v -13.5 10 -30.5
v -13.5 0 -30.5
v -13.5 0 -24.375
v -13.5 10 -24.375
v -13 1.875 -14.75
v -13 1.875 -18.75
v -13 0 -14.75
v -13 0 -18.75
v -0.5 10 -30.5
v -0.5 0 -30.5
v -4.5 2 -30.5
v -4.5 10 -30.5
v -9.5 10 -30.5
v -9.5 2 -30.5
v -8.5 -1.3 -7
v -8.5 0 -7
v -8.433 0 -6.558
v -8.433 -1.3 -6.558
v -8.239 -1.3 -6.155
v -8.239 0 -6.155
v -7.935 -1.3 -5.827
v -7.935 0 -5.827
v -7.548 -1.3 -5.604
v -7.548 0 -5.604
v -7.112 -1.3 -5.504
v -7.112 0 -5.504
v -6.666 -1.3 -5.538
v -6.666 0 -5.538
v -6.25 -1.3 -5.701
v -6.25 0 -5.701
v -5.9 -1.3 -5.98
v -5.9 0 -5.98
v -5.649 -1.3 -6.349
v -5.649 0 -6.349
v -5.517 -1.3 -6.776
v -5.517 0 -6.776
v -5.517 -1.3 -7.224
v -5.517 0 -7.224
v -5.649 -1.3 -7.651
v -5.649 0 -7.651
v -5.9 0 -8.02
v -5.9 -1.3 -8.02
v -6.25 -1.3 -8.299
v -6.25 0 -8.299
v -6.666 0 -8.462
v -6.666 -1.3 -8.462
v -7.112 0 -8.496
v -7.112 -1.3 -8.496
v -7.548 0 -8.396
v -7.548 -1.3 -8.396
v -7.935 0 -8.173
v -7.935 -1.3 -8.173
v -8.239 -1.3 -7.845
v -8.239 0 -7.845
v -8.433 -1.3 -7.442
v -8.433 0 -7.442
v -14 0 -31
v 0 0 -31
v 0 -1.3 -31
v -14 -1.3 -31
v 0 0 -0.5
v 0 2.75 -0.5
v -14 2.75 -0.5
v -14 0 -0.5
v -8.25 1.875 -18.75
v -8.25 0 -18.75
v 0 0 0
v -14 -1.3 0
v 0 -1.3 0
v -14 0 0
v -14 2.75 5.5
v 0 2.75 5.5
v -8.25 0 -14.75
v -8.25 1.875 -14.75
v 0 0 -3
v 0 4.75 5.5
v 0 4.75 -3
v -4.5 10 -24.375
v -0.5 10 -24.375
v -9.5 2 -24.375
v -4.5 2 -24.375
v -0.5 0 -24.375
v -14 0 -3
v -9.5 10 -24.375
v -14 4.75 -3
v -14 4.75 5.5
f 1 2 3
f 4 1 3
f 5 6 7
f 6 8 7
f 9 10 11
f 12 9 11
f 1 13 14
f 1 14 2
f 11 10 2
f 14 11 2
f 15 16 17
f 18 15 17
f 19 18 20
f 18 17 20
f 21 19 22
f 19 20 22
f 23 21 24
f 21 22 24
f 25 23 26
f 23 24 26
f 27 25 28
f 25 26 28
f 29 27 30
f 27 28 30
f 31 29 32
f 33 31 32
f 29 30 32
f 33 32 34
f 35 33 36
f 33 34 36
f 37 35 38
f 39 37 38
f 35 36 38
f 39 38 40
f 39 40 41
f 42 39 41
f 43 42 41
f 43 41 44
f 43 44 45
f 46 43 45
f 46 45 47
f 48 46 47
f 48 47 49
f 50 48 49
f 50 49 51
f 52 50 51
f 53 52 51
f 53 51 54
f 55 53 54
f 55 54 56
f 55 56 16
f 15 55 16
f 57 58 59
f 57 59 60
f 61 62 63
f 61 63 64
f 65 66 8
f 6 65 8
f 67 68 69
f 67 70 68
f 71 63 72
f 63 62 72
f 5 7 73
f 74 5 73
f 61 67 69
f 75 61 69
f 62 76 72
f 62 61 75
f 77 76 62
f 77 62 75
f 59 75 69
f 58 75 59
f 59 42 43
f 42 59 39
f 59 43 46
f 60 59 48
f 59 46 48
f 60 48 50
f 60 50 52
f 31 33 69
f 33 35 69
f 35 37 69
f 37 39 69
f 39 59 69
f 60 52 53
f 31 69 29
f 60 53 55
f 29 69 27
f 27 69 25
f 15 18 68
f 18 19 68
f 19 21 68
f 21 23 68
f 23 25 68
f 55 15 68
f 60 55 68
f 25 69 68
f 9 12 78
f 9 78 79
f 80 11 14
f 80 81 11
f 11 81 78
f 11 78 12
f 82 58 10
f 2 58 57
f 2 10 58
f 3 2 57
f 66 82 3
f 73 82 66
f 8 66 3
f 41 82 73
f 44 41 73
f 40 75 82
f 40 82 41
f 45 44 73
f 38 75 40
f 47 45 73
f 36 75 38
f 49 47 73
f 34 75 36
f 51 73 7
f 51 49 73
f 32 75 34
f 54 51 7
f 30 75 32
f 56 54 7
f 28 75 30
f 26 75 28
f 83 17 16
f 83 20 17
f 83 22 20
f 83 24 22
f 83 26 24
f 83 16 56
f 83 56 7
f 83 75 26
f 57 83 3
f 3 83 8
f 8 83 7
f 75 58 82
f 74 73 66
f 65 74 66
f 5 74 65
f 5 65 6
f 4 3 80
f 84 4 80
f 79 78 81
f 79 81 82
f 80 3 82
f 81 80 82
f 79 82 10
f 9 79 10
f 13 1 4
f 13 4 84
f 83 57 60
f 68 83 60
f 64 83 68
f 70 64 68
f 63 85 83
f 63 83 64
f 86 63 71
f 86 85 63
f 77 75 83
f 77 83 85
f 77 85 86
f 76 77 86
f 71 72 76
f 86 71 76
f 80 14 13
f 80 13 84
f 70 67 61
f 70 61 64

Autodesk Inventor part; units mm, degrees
ref_plane "YZ Plane" through (0, 0, 0) normal (1, 0, 0) x (0, 1, 0)
ref_plane "XZ Plane" through (0, 0, 0) normal (0, 1, 0) x (-1, 0, 0)
ref_plane "XY Plane" through (0, 0, 0) normal (0, 0, 1) x (1, 0, 0)
sketch "Sketch1" plane through (0, 0, 0) normal (0, 1, 0) x (-1, 0, 0)
  line L0 (0, -31) -> (14, -31)
  line L1 (14, -31) -> (14, 0)
  line L2 (14, 0) -> (7, 0)
  line L3 (0, 0) -> (0, -31)
  line L4 (0.5, -30.5) -> (13.5, -30.5)
  line L5 (13.5, -30.5) -> (13.5, -24.375)
  line L6 (13.5, -24.375) -> (0.5, -24.375)
  line L7 (0.5, -24.375) -> (0.5, -30.5)
  circle A0 centre (7, -7) radius 1.5
  line L8 (7, 0) -> (7, -31) construction
  line L9 (7, 0) -> (0, 0)
  line L10 (13, -14.75) -> (8.25, -14.75)
  line L11 (8.25, -14.75) -> (8.25, -18.75)
  line L12 (8.25, -18.75) -> (13, -18.75)
  line L13 (13, -18.75) -> (13, -14.75)
  dimension "d0" = 14
  dimension "d1" = 31
  dimension "d2" = 0.5
  dimension "d3" = 13
  dimension "d4" = 6.125
  dimension "d5" = 0.5
  dimension "d7" = 3
  dimension "d8" = 7
  dimension "d9" = 1
  dimension "d10" = 14.75
  dimension "d11" = 4
  dimension "d12" = 4.75
extrude "Extrusion1" add sketch "Sketch1" against normal blind 1.3 contours L3 L9 L2 L1 L0 | L7 L6 L5 L4 | L13 L12 L11 L10
extrude "Extrusion2" add sketch "Sketch1" along normal blind 2 contours L7 L6 L5 L4
extrude "Extrusion3" add sketch "Sketch1" along normal blind 1.875 contours L13 L12 L11 L10
sketch "Sketch2" plane through (0, 2, 0) normal (0, 1, 0) x (1, 0, 0)
  line L0 (-13.5, 30.5) -> (-0.5, 30.5) projected
  line L1 (-0.5, 24.375) -> (-13.5, 24.375) projected
  line L2 (-4.5, 30.5) -> (-0.5, 30.5)
  line L3 (-0.5, 30.5) -> (-0.5, 24.375)
  line L4 (-0.5, 24.375) -> (-4.5, 24.375)
  line L5 (-4.5, 24.375) -> (-4.5, 30.5)
  line L6 (-13.5, 24.375) -> (-13.5, 30.5) projected
  line L7 (-13.5, 30.5) -> (-9.5, 30.5)
  line L8 (-9.5, 30.5) -> (-9.5, 24.375)
  line L9 (-9.5, 24.375) -> (-13.5, 24.375)
  line L10 (-13.5, 24.375) -> (-13.5, 30.5)
  point P0 (0, 0)
  dimension "d19" = 4
  dimension "d20" = 4
extrude "Extrusion4" add sketch "Sketch2" along normal blind 8 contours L0 L8 L1 L6 | L0 L3 L1 L5
sketch "Sketch3" plane through (0, 0, 0) normal (1, 0, 0) x (0, 1, 0)
  line L0 (0, 0) -> (0, -31) projected
  line L1 (0, -3) -> (4.75, -3)
  line L2 (4.75, -3) -> (4.75, -0.5)
  line L3 (4.75, -0.5) -> (0, -0.5)
  line L4 (0, -0.5) -> (0, -3)
  line L5 (0, 0) -> (-1.3, 0) projected
  line L6 (4.75, -0.5) -> (2.75, -0.5)
  line L7 (2.75, -0.5) -> (2.75, 5.5)
  line L8 (2.75, 5.5) -> (4.75, 5.5)
  line L9 (4.75, 5.5) -> (4.75, -0.5)
  point P0 (0, -0.5)
  dimension "d23" = 4.75
  dimension "d24" = 2.5
  dimension "d25" = 0.5
  dimension "d26" = 8.5
  dimension "d27" = 2
extrude "Extrusion5" add sketch "Sketch3" against normal up to surface (14 mm away)
properties part number "LM393 encoder"
